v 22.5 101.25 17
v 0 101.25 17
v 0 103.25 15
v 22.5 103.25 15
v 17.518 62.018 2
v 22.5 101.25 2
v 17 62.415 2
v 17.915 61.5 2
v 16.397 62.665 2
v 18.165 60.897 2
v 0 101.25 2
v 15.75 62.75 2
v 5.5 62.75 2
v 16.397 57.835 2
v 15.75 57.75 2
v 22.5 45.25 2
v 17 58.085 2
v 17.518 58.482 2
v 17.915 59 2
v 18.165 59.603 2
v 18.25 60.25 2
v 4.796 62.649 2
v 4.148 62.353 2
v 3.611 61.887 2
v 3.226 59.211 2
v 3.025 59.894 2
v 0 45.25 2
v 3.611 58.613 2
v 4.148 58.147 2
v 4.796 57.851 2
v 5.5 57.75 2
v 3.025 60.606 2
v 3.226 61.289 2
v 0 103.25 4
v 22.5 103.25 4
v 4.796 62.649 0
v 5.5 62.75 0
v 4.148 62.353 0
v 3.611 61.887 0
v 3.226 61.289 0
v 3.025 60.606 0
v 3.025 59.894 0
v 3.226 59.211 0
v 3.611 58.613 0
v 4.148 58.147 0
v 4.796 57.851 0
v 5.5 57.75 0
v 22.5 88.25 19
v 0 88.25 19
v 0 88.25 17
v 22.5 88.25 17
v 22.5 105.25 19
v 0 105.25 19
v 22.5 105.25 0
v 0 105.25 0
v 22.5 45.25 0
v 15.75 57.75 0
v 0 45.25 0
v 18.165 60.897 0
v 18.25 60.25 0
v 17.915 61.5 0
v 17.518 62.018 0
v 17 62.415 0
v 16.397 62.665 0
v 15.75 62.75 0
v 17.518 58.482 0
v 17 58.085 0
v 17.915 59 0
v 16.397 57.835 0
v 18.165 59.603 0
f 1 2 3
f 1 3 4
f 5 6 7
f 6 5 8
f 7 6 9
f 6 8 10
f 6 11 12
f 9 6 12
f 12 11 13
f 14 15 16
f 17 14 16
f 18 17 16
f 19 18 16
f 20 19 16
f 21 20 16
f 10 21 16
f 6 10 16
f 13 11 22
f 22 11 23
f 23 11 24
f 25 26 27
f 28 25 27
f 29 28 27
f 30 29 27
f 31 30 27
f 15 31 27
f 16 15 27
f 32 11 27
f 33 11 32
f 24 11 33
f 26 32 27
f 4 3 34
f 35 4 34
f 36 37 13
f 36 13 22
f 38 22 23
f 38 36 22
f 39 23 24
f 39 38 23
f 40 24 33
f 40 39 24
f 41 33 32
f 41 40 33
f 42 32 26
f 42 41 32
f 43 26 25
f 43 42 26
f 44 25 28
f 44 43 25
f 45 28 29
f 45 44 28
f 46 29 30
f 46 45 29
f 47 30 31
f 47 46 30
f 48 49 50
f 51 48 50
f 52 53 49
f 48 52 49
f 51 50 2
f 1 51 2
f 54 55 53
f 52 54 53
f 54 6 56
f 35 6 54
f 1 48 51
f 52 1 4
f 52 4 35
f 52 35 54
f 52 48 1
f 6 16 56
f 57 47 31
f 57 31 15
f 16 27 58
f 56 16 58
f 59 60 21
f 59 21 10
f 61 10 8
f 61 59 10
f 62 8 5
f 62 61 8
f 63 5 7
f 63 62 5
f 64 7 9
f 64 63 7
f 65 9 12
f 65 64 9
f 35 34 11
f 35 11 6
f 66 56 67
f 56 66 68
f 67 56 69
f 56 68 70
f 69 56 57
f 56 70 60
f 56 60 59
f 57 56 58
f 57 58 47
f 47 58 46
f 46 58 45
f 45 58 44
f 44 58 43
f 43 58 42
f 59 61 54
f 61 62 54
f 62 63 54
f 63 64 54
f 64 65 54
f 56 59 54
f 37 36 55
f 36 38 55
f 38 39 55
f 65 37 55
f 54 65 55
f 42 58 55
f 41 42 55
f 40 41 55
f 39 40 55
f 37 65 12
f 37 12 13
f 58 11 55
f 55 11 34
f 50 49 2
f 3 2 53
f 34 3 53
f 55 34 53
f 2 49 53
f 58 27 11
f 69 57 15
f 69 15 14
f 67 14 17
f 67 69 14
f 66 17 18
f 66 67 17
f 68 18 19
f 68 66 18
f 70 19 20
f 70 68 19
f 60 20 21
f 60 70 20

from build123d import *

# Parameters (mm, degrees)
F6_DEPTH = 22.5
F7_DEPTH = 2
F8_SIZE  = 2


with BuildPart() as f6:
    # F5 (on Right) → F6 (new body)
    with BuildSketch(Plane.YZ):
        Polygon((45.25, 2), (45.25, 0), (57.75, 0), (62.75, 0), (105.25, 0), (105.25, 2), (105.25, 17), (105.25, 19), (88.25, 19), (88.25, 17), (103.25, 17), (103.25, 2), align=None)
    extrude(amount=F6_DEPTH)

    # F4 (on Top) → F7 (cut, through all)
    with BuildSketch(Plane.XY):
        with BuildLine():
            ThreePointArc((18.25, 60.25), (17.517766953, 62.017766953), (15.75, 62.75))
            ThreePointArc((15.75, 62.75), (13.25, 60.25), (15.75, 57.75))
            ThreePointArc((15.75, 57.75), (17.517766953, 58.482233047), (18.25, 60.25))
        make_face()
        with BuildLine():
            ThreePointArc((5.5, 62.75), (7.267766953, 62.017766953), (8, 60.25))
            ThreePointArc((8, 60.25), (7.267766953, 58.482233047), (5.5, 57.75))
            Line((5.5, 57.75), (15.75, 57.75))
            ThreePointArc((15.75, 57.75), (13.25, 60.25), (15.75, 62.75))
            Line((15.75, 62.75), (5.5, 62.75))
        make_face()
        with BuildLine():
            ThreePointArc((5.5, 57.75), (7.267766953, 58.482233047), (8, 60.25))
            ThreePointArc((8, 60.25), (7.267766953, 62.017766953), (5.5, 62.75))
            ThreePointArc((5.5, 62.75), (3, 60.25), (5.5, 57.75))
        make_face()
    extrude(amount=F7_DEPTH, mode=Mode.SUBTRACT)

    # F8
    f8_edges = [f6.edges().sort_by_distance(p)[0] for p in [
        (11.25, 103.25, 2),
        (11.25, 103.25, 17),
    ]]
    chamfer(f8_edges, length=F8_SIZE)


solid = f6.part
